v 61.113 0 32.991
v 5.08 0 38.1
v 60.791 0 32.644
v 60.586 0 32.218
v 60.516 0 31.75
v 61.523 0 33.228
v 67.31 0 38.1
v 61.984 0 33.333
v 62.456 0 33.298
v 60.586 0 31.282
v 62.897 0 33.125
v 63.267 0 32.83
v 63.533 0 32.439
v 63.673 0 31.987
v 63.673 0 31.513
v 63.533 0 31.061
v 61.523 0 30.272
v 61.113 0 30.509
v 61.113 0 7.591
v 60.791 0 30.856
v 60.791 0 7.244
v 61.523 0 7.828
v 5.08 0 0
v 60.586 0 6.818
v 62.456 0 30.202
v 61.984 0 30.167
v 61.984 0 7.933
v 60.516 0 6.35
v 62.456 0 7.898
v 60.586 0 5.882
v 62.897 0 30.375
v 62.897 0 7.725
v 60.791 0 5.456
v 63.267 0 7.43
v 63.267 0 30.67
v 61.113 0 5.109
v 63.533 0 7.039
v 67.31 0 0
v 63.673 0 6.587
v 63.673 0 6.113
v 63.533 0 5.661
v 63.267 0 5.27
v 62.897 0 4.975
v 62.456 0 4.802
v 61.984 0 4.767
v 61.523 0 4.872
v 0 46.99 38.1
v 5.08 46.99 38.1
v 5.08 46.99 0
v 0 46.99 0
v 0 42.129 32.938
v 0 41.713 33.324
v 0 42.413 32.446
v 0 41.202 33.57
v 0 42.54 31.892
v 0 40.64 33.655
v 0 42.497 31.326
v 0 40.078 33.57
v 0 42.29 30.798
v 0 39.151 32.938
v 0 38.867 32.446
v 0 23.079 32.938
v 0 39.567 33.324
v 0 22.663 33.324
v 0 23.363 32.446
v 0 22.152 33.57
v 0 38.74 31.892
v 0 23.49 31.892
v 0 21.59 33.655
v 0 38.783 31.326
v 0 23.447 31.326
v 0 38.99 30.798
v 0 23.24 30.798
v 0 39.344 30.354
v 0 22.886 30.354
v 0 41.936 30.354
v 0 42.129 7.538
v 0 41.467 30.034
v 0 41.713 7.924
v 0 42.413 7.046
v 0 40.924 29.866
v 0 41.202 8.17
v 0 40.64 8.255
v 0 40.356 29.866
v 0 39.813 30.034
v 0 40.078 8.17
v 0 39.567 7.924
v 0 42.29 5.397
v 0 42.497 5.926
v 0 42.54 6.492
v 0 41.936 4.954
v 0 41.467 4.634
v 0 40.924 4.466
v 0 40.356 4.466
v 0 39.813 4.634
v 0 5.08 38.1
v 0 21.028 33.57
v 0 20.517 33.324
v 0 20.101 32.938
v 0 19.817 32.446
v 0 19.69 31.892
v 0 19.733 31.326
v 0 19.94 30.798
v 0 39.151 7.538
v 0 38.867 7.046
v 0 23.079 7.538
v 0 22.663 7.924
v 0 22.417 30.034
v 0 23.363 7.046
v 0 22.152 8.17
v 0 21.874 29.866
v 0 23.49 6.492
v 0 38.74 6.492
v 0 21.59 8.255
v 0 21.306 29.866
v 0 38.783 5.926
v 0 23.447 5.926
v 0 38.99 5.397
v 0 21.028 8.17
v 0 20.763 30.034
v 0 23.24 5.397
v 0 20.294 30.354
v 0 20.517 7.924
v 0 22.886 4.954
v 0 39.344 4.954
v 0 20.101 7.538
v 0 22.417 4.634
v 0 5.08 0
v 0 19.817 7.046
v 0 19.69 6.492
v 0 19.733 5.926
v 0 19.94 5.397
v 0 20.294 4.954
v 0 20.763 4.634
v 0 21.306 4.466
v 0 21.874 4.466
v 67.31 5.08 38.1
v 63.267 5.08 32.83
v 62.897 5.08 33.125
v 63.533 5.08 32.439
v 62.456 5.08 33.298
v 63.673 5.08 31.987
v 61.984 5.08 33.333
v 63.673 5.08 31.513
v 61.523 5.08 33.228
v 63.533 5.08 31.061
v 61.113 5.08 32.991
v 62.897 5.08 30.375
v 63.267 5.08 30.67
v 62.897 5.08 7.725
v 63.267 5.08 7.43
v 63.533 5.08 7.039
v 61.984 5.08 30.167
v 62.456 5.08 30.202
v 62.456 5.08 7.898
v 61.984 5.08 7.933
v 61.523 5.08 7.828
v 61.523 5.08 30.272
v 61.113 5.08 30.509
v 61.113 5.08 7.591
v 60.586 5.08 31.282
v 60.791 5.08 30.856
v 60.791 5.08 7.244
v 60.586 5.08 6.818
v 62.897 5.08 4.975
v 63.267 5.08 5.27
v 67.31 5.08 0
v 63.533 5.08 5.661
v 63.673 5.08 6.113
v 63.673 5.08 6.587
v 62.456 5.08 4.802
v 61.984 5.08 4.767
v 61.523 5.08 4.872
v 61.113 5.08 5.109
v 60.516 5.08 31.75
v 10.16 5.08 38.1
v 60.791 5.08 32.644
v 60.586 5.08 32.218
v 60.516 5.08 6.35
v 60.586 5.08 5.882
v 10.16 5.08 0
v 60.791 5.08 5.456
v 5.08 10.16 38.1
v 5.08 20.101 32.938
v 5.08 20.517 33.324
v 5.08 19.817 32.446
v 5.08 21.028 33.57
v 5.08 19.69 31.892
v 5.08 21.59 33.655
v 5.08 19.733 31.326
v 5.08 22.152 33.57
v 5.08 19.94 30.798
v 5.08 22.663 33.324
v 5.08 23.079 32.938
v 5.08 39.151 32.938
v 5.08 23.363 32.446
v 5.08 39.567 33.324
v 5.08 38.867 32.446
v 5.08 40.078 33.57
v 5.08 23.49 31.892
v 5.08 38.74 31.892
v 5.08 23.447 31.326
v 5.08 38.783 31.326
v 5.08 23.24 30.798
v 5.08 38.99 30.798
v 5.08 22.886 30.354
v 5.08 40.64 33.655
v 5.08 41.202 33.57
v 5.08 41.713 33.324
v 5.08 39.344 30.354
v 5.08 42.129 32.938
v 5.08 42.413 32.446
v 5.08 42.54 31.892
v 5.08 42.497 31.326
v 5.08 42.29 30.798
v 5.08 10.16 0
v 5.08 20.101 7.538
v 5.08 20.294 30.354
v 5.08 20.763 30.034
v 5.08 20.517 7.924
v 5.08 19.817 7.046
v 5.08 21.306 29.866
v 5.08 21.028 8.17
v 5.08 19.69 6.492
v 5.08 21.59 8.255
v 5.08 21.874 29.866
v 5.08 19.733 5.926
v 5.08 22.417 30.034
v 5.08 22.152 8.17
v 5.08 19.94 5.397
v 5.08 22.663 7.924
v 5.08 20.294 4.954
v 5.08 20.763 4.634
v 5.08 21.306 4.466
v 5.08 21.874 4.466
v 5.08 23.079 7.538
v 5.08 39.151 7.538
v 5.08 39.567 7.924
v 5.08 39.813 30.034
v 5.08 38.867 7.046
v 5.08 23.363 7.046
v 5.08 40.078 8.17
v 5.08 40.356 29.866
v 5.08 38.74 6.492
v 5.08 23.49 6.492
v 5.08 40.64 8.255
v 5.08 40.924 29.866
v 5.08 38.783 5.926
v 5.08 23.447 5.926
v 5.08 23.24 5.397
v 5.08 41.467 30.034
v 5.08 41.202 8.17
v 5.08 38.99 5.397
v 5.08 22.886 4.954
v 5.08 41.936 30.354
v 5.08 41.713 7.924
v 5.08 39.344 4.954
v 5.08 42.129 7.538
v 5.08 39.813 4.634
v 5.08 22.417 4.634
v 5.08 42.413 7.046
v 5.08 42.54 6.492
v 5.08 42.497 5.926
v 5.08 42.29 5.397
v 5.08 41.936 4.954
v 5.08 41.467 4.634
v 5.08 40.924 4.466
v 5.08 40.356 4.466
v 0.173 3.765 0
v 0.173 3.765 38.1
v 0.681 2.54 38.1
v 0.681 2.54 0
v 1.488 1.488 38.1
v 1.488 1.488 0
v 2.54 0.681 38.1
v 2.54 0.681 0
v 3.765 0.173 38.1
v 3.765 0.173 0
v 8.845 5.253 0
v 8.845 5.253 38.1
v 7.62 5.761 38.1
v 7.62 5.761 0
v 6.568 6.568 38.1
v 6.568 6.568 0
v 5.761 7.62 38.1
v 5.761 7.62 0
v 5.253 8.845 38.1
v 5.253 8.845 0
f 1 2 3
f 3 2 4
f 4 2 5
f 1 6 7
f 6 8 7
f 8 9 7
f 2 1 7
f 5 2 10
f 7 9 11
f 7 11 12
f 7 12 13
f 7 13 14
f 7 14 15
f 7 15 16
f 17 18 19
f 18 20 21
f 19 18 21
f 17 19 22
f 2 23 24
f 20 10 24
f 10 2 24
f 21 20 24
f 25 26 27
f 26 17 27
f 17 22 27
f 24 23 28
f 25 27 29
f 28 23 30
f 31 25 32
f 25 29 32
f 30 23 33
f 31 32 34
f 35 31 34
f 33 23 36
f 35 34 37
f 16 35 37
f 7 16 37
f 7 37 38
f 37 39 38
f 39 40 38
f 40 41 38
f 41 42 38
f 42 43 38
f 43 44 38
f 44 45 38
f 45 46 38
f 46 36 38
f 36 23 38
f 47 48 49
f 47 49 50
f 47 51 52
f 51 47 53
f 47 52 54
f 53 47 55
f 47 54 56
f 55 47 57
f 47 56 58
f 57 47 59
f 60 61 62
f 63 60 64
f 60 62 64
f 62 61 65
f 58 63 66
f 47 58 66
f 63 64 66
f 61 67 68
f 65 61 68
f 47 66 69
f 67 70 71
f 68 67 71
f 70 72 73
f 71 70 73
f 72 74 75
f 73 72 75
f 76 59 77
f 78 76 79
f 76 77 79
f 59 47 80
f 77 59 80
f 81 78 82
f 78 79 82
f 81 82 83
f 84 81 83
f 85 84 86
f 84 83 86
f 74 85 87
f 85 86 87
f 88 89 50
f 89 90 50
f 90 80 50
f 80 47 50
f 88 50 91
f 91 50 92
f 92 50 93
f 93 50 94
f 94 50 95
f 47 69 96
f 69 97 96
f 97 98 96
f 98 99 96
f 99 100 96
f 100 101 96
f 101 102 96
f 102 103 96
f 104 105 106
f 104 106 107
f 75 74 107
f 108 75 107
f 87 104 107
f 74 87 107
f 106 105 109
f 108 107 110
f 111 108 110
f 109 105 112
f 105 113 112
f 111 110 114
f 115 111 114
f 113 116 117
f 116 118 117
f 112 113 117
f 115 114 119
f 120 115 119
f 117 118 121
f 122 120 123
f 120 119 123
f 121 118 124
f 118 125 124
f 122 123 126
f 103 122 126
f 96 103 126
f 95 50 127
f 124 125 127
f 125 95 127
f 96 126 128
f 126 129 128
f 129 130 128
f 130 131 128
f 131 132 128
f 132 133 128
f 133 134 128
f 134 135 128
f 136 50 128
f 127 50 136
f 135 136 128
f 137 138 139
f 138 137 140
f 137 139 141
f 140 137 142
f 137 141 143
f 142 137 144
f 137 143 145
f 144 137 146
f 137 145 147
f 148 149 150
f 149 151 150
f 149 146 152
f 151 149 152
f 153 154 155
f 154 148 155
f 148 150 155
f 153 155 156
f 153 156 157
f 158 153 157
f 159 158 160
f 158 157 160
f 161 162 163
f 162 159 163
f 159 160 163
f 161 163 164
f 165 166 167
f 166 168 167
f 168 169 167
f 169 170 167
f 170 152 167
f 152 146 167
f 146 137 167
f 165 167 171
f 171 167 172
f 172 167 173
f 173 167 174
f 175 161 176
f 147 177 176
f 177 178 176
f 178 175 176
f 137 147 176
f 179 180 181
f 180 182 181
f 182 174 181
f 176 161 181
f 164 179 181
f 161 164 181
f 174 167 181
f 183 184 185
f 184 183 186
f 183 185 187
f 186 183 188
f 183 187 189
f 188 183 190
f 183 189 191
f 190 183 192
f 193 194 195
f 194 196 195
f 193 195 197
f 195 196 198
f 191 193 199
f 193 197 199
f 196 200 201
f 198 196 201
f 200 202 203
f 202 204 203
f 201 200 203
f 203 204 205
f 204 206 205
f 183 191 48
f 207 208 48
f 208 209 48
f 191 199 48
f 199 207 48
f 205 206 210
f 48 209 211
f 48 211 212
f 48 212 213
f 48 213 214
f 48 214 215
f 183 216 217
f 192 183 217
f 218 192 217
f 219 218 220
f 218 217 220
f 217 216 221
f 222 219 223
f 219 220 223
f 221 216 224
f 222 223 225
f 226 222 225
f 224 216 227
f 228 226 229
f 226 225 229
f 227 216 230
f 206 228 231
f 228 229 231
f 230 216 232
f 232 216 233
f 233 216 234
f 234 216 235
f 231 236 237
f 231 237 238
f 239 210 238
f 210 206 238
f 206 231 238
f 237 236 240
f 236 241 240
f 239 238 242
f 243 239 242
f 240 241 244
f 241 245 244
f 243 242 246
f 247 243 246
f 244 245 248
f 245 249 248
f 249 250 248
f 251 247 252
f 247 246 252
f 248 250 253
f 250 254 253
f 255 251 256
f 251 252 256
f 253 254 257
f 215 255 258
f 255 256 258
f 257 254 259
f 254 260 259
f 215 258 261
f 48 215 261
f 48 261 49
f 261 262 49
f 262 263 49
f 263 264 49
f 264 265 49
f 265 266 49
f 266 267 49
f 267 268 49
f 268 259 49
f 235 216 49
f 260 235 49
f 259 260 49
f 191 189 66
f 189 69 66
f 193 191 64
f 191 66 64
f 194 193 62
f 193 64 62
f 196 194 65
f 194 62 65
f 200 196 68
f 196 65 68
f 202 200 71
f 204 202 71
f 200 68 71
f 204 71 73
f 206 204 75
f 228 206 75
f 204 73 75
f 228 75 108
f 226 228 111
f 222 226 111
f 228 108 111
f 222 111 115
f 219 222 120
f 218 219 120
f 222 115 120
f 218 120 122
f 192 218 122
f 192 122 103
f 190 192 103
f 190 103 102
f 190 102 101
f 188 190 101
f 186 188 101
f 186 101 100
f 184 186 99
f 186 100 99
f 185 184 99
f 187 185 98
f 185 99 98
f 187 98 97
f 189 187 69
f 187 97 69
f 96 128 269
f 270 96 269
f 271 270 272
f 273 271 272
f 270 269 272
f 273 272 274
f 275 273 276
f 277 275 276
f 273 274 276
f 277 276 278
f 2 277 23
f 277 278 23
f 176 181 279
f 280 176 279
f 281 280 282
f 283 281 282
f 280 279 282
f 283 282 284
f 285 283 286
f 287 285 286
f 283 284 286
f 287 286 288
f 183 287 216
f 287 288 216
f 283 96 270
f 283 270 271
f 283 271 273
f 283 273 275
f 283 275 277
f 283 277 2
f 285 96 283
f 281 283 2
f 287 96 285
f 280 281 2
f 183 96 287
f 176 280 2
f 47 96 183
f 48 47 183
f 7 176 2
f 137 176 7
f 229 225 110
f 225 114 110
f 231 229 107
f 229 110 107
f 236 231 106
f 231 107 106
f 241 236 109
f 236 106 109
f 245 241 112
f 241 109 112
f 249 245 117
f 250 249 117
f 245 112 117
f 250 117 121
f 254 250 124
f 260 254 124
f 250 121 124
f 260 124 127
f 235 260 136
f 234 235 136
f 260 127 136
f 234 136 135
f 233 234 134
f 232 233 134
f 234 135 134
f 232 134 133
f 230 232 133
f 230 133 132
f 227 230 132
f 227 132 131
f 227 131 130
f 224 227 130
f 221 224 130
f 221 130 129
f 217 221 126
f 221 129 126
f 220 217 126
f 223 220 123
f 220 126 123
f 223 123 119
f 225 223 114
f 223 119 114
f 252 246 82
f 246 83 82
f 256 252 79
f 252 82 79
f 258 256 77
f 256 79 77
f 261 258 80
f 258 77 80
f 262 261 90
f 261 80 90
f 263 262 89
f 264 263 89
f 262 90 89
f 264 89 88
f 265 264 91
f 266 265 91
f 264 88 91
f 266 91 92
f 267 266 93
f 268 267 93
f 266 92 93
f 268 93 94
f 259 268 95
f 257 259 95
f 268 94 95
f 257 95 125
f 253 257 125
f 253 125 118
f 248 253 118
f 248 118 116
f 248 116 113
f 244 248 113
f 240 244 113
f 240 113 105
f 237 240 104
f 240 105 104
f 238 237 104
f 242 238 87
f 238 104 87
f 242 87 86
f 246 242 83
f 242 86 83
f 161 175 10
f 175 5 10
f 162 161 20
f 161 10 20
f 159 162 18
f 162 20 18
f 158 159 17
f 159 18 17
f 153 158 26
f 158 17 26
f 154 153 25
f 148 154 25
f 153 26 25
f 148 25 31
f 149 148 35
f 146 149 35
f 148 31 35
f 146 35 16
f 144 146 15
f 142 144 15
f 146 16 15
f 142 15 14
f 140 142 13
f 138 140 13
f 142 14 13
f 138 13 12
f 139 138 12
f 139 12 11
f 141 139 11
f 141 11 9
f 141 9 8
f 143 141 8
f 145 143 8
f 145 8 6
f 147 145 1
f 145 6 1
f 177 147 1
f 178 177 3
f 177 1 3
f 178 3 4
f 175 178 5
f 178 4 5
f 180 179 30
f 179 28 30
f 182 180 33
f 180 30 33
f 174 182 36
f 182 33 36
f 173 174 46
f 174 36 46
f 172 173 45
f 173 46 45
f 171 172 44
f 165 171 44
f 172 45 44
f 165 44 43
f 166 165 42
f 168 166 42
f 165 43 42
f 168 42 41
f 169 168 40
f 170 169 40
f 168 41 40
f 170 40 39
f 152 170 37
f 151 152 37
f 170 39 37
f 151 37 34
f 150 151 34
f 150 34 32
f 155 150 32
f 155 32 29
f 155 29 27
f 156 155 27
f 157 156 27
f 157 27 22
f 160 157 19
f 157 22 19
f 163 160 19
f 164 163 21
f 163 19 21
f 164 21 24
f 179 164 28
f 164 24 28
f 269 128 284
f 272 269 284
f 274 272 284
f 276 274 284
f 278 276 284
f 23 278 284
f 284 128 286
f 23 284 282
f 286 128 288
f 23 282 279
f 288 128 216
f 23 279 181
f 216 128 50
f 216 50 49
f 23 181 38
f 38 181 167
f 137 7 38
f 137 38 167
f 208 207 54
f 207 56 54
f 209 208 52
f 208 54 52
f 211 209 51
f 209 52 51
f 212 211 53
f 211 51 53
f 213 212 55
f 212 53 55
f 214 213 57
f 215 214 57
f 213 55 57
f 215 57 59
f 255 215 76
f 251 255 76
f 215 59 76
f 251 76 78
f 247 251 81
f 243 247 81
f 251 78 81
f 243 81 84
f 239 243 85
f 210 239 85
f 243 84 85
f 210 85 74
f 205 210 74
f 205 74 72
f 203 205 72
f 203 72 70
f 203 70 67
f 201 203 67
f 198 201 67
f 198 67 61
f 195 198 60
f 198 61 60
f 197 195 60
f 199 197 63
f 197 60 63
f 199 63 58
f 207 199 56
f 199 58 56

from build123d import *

# Parameters (mm, degrees)
BOSS_EXTRUDE1_DEPTH              = 38.1
F_1_8_0_125_DIAMETER_HOLE1_D     = 3.175
F_1_8_0_125_DIAMETER_HOLE1_DEPTH = 5.08
F_1_8_0_125_DIAMETER_HOLE1_TIP   = 0.953866233
F_1_8_0_15_DIAMETER_HOLE1_D      = 3.81
F_1_8_0_15_DIAMETER_HOLE1_DEPTH  = 5.08
F_1_8_0_15_DIAMETER_HOLE1_TIP    = 1.144639479


with BuildPart() as part:
    # Sketch1 → Boss-Extrude1 (new body)
    with BuildSketch(Plane.XY):
        with BuildLine():
            Line((5.08, 0), (67.31, 0))
            Line((67.31, 0), (67.31, 5.08))
            Line((67.31, 5.08), (10.16, 5.08))
            ThreePointArc((10.16, 5.08), (6.567897552, 6.567897552), (5.08, 10.16))
            Line((5.08, 10.16), (5.08, 46.99))
            Line((5.08, 46.99), (0, 46.99))
            Line((0, 46.99), (0, 5.08))
            ThreePointArc((0, 5.08), (1.487897552, 1.487897552), (5.08, 0))
        make_face()
    extrude(amount=BOSS_EXTRUDE1_DEPTH)

    # 1/8 (0.125) Diameter Hole1
    with Locations(Plane(origin=(0, 5.08, 0), x_dir=(1, 0, 0), z_dir=(0, 1, 0))):
        with Locations((62.103, -31.75), (62.103, -6.35)):
            Hole(F_1_8_0_125_DIAMETER_HOLE1_D / 2, depth=F_1_8_0_125_DIAMETER_HOLE1_DEPTH)
            with Locations((0, 0, -(F_1_8_0_125_DIAMETER_HOLE1_DEPTH + F_1_8_0_125_DIAMETER_HOLE1_TIP / 2))):  # 118° drill point
                Cone(0, F_1_8_0_125_DIAMETER_HOLE1_D / 2, F_1_8_0_125_DIAMETER_HOLE1_TIP, mode=Mode.SUBTRACT)

    # 1/8 (0.15) Diameter Hole1
    with Locations(Plane(origin=(5.08, 0, 0), x_dir=(0, 0, -1), z_dir=(1, 0, 0))):
        with Locations((-31.75, 40.64), (-6.35, 40.64), (-6.35, 21.59), (-31.75, 21.59)):
            Hole(F_1_8_0_15_DIAMETER_HOLE1_D / 2, depth=F_1_8_0_15_DIAMETER_HOLE1_DEPTH)
            with Locations((0, 0, -(F_1_8_0_15_DIAMETER_HOLE1_DEPTH + F_1_8_0_15_DIAMETER_HOLE1_TIP / 2))):  # 118° drill point
                Cone(0, F_1_8_0_15_DIAMETER_HOLE1_D / 2, F_1_8_0_15_DIAMETER_HOLE1_TIP, mode=Mode.SUBTRACT)


solid = part.part
